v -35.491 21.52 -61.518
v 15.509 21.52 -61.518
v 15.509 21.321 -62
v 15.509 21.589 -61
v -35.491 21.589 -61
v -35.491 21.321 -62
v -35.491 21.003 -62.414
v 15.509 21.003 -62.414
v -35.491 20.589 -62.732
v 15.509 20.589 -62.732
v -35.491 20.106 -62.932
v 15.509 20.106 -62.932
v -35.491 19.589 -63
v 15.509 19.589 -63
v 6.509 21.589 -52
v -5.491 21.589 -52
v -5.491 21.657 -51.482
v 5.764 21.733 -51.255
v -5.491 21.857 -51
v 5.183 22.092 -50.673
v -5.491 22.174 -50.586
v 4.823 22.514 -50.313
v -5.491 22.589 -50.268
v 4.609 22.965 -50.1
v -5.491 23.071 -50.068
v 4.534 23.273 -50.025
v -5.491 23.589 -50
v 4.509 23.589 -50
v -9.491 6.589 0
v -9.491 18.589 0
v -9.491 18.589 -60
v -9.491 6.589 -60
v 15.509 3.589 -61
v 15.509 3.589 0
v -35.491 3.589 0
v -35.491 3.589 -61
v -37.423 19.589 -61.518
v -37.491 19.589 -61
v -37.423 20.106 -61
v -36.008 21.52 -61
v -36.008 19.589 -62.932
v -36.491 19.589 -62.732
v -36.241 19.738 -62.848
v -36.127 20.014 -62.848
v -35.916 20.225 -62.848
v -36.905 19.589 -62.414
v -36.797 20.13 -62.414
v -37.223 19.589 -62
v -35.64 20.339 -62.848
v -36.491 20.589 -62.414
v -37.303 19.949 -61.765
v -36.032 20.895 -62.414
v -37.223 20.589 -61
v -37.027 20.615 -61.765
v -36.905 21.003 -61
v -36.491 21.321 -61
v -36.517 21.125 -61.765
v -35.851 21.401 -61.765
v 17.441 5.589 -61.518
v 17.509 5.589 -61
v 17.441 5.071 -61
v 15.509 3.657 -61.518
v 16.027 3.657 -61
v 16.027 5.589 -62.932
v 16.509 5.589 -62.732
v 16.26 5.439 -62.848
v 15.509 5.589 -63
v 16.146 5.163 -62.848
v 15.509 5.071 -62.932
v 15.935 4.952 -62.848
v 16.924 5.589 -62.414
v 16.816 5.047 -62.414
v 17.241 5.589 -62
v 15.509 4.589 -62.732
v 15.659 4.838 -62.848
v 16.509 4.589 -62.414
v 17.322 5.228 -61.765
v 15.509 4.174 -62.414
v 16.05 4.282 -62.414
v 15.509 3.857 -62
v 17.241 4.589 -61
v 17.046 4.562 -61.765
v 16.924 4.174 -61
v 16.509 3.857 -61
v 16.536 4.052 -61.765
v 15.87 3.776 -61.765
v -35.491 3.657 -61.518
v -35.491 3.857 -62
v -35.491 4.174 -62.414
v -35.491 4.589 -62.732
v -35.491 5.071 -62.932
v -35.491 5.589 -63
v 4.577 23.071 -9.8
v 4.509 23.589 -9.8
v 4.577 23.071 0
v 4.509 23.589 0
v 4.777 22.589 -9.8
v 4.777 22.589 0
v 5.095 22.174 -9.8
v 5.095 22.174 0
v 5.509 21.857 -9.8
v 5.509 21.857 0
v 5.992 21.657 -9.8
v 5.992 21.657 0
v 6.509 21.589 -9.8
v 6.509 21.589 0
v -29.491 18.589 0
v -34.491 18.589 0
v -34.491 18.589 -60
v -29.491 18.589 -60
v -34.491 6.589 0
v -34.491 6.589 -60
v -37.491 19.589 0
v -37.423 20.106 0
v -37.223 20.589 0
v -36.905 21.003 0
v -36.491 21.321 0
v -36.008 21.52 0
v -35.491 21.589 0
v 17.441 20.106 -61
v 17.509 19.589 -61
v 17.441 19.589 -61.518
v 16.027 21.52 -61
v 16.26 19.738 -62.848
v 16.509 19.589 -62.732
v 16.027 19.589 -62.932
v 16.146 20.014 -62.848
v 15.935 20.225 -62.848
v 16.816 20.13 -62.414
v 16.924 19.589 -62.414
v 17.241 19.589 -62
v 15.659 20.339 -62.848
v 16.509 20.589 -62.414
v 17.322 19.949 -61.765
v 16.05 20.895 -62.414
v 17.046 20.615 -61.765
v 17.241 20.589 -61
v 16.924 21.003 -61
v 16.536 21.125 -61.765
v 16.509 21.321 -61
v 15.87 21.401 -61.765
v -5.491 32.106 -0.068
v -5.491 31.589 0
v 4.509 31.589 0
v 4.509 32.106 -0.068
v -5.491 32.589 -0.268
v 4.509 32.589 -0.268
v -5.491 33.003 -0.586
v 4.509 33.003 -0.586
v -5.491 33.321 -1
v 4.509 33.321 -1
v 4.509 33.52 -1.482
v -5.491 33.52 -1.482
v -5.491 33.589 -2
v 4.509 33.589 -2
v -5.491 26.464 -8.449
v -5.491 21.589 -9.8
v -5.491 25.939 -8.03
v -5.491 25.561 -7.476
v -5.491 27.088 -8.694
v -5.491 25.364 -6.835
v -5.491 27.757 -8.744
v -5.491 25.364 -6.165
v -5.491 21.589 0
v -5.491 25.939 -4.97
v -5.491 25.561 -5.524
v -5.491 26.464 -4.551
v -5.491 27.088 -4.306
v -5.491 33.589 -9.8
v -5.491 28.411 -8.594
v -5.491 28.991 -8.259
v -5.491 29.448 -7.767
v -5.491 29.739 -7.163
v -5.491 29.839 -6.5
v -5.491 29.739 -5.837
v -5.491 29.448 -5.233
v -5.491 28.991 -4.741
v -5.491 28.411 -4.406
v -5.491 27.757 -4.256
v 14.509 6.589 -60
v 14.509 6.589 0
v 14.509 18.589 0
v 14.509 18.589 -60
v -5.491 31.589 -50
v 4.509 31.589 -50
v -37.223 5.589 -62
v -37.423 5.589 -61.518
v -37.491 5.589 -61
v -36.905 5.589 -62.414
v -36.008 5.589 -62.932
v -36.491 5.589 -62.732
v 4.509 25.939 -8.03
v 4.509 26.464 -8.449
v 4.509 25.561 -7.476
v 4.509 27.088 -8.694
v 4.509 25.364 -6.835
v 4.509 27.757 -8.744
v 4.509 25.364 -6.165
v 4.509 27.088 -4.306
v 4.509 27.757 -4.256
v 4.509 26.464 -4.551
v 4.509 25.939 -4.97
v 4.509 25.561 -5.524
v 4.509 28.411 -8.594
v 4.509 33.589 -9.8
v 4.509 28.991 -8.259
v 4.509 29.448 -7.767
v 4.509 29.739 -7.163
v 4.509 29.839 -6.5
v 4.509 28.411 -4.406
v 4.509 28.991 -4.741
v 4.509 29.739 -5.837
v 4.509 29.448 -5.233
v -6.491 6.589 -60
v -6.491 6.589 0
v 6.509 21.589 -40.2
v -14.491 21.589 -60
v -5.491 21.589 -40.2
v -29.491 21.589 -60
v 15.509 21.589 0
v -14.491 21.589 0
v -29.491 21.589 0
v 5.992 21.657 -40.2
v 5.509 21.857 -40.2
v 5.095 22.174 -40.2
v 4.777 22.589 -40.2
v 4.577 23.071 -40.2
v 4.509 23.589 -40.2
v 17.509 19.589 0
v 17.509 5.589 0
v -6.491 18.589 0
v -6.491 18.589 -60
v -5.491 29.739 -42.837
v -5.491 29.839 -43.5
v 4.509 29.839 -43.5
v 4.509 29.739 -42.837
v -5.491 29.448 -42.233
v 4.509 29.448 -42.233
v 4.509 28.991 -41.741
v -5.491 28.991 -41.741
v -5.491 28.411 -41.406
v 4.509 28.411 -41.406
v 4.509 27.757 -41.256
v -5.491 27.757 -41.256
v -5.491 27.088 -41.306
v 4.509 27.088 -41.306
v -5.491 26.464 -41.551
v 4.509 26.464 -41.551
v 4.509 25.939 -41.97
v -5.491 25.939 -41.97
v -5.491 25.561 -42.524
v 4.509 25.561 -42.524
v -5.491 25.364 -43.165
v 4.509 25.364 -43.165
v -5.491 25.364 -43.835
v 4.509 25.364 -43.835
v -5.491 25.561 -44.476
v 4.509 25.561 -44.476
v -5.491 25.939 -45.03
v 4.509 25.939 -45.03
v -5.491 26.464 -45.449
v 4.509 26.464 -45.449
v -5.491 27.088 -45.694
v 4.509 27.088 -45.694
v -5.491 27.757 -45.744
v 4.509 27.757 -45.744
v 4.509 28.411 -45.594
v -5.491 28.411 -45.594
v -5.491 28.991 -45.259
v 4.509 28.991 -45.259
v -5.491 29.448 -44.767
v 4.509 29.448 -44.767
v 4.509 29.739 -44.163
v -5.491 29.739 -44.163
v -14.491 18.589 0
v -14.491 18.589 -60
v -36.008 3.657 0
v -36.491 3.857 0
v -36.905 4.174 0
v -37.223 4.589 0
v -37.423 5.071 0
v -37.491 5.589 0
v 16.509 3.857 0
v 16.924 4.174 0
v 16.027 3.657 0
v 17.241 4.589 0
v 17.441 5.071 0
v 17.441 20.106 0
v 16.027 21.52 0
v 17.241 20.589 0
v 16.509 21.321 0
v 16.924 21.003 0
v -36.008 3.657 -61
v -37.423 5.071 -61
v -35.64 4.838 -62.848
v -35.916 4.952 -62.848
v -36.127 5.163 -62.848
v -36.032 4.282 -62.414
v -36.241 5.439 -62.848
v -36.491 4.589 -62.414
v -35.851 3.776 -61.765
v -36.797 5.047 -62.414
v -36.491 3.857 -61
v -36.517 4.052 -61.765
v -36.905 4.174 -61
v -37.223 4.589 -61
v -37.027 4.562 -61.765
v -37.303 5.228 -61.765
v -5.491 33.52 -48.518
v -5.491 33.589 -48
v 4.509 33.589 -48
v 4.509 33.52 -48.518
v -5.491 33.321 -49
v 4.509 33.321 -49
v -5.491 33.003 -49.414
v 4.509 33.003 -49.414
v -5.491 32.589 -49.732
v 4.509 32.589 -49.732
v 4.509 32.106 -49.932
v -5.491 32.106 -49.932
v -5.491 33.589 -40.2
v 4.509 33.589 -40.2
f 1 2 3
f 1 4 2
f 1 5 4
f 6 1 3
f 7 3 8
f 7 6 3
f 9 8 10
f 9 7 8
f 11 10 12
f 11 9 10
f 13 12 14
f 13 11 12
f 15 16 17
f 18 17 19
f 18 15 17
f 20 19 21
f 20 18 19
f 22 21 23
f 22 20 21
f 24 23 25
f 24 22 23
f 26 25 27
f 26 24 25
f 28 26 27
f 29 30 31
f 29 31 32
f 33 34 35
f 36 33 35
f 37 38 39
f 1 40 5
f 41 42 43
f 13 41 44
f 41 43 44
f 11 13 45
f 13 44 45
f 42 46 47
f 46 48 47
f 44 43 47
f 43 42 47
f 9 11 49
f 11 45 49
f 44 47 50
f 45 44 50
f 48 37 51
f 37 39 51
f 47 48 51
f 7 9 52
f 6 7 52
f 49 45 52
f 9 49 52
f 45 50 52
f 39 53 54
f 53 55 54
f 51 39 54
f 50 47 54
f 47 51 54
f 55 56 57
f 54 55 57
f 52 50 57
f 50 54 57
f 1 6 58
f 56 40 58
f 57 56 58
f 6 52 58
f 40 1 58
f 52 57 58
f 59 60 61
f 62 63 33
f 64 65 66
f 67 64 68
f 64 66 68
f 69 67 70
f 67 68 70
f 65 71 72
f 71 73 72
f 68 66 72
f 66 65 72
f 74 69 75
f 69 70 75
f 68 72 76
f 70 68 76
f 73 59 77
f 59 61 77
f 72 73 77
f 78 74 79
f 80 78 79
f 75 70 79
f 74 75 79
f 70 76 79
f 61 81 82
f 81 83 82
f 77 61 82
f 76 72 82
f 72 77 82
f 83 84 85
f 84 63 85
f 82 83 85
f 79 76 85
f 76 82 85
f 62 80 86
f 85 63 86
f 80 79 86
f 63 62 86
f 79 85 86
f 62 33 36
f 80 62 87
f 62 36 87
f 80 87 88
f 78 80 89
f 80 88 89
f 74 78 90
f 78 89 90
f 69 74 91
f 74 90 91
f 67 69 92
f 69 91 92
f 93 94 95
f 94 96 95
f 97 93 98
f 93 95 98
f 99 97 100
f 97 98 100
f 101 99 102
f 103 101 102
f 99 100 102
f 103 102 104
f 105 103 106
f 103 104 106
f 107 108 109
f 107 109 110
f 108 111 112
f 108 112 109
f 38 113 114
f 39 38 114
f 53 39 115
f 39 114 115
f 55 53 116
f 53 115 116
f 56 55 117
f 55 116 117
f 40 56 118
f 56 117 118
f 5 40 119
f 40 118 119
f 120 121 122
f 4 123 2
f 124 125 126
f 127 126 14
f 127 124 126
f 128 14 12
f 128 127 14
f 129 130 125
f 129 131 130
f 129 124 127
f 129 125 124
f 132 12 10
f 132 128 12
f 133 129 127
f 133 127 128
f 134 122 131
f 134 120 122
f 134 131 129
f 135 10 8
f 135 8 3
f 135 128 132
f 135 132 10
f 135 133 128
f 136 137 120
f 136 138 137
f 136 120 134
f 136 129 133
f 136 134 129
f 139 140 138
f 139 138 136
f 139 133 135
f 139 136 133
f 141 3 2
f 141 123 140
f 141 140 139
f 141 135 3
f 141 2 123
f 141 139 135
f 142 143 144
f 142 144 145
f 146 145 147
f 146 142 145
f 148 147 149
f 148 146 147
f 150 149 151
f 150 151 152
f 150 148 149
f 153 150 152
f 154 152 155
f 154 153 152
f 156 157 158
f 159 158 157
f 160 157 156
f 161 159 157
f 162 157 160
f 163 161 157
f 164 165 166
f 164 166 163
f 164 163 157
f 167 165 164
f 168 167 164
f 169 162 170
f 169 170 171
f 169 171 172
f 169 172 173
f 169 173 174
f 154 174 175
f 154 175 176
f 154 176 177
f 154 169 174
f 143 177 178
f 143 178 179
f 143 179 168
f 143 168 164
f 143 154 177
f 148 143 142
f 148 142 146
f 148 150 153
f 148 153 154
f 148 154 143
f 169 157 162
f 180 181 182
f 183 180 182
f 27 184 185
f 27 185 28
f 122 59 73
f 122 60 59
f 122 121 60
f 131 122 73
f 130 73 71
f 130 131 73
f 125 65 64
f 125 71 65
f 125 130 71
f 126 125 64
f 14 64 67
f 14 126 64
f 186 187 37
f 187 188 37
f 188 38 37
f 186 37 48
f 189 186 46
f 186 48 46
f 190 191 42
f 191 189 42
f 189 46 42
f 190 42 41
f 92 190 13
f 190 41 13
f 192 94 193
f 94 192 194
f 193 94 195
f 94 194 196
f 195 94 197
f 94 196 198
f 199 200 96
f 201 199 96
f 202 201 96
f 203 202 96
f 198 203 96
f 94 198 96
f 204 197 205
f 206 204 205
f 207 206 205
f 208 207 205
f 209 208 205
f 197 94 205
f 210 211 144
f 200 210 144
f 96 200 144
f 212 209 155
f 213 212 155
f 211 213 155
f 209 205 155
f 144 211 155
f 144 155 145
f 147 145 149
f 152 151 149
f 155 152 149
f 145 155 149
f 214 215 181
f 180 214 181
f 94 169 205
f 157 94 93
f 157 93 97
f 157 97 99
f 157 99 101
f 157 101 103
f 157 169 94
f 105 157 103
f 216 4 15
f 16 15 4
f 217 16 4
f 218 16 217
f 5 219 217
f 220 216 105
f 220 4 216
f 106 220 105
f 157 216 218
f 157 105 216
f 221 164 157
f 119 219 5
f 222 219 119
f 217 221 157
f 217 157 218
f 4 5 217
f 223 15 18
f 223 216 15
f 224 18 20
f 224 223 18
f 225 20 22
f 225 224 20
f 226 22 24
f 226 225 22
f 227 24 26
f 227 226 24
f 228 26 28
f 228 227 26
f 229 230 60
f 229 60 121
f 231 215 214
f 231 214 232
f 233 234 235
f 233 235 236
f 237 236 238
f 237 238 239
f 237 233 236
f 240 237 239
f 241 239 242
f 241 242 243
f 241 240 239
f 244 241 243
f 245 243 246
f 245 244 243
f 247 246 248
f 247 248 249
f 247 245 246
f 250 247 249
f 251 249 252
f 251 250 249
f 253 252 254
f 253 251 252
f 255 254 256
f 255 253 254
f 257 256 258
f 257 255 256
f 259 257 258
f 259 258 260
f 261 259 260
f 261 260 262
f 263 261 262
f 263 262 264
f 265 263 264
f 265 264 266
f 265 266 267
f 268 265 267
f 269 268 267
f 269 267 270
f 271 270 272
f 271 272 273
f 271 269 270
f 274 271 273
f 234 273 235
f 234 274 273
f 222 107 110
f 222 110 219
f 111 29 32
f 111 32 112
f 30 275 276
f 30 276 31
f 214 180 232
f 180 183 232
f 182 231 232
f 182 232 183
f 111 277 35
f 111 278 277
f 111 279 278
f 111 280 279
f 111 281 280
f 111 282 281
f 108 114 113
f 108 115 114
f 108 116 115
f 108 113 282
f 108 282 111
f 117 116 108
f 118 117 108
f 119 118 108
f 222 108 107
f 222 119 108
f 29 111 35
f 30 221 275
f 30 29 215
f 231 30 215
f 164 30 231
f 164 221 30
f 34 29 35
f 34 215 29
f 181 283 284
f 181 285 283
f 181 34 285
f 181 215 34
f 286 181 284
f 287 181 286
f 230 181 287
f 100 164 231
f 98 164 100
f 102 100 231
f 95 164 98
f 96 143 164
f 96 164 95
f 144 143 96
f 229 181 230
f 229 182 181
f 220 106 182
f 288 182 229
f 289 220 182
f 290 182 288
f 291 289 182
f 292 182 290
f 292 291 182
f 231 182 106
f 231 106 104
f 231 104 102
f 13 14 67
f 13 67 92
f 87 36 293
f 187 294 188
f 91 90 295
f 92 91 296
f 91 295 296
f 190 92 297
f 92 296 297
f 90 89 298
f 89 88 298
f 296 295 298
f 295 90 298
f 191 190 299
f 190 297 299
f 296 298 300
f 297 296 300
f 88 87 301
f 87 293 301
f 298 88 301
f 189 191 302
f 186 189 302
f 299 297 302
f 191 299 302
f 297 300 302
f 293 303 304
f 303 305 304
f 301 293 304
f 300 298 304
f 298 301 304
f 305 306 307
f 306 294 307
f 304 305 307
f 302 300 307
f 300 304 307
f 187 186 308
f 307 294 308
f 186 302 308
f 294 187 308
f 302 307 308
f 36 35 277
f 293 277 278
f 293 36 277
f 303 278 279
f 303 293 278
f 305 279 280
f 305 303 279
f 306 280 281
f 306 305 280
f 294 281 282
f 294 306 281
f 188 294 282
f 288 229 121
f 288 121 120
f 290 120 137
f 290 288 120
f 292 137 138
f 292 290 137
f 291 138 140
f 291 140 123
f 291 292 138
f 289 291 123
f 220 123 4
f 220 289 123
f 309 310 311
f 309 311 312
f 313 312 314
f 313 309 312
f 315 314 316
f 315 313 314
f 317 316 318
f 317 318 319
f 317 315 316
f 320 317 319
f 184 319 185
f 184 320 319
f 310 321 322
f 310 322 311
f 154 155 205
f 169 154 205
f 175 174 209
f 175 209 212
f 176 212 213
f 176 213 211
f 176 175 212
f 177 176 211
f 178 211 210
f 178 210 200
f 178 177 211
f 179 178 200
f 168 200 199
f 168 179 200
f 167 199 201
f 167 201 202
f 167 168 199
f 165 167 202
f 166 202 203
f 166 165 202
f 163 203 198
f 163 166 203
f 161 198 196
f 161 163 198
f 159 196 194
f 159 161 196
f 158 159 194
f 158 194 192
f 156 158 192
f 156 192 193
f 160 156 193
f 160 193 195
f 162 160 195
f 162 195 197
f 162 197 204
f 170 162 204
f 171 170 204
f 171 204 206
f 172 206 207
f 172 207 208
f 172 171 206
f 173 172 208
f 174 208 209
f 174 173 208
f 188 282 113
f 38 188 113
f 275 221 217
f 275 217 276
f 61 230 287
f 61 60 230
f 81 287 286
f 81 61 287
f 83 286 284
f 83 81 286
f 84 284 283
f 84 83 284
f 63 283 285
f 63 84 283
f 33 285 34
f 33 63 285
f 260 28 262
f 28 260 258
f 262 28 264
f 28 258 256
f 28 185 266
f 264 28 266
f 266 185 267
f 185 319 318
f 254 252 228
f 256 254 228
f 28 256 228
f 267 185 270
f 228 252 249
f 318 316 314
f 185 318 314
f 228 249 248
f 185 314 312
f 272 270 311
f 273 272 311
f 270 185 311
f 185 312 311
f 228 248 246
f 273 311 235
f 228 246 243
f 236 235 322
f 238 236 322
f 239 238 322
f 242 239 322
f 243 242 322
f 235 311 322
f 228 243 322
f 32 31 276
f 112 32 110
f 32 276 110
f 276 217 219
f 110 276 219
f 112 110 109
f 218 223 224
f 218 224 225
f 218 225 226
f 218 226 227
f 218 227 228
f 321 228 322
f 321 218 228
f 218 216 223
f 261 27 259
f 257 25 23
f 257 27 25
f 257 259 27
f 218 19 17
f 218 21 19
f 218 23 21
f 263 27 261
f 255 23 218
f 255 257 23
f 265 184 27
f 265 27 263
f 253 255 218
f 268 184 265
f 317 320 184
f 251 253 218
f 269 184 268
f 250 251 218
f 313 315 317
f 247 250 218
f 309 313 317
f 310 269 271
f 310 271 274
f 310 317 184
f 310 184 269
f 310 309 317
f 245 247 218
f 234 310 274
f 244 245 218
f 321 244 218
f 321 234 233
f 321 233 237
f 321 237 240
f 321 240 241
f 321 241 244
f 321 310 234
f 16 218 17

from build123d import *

# Parameters (mm, degrees)
SKETCH1_W           = 21
SKETCH1_H           = 12
BOSS_EXTRUDE1_DEPTH = 60
SKETCH2_R           = 2.25
BOSS_EXTRUDE2_DEPTH = 10
SKETCH3_W           = 55
SKETCH3_H           = 18
BOSS_EXTRUDE3_DEPTH = 3
FILLET1_R           = 2


with BuildPart() as part:
    # Sketch1 → Boss-Extrude1 (new body)
    with BuildSketch(Plane.XY):
        Polygon((17.509291985, 21.588576814), (-9.490708015, 21.588576814), (-14.490708015, 21.588576814), (-14.490708015, 18.588576814), (-9.490708015, 18.588576814), (-9.490708015, 6.588576814), (-34.490708015, 6.588576814), (-34.490708015, 18.588576814), (-29.490708015, 18.588576814), (-29.490708015, 21.588576814), (-34.490708015, 21.588576814), (-37.490708015, 21.588576814), (-37.490708015, 3.588576814), (17.509291985, 3.588576814), align=None)
        with Locations((4.009291985, 12.588576814)):
            Rectangle(SKETCH1_W, SKETCH1_H, mode=Mode.SUBTRACT)
    extrude(amount=-BOSS_EXTRUDE1_DEPTH)

    # Sketch2 → Boss-Extrude2 (add)
    # profile 1 of 2: a face of its own
    with BuildSketch(Plane(origin=(-5.490708015, 0, 0), x_dir=(0, 0, -1), z_dir=(1, 0, 0))):
        with BuildLine():
            Line((50, 21.588576814), (40.2, 21.588576814))
            Line((40.2, 21.588576814), (40.2, 33.588576814))
            Line((40.2, 33.588576814), (48, 33.588576814))
            ThreePointArc((48, 33.588576814), (49.414213562, 33.002790376), (50, 31.588576814))
            Line((50, 31.588576814), (50, 21.588576814))
        make_face()
        with Locations(Location((43.5, 27.588576814, 0), (0, 0, 90))):
            Circle(SKETCH2_R, mode=Mode.SUBTRACT)
    # profile 2 of 2: a face of its own
    with BuildSketch(Plane(origin=(-5.490708015, 0, 0), x_dir=(0, 0, -1), z_dir=(1, 0, 0))):
        with BuildLine():
            Line((9.8, 21.588576814), (0, 21.588576814))
            Line((0, 21.588576814), (0, 31.588576814))
            ThreePointArc((0, 31.588576814), (0.585786438, 33.002790376), (2, 33.588576814))
            Line((2, 33.588576814), (9.8, 33.588576814))
            Line((9.8, 33.588576814), (9.8, 21.588576814))
        make_face()
        with Locations(Location((6.5, 27.588576814, 0), (0, 0, 90))):
            Circle(SKETCH2_R, mode=Mode.SUBTRACT)
    extrude(amount=BOSS_EXTRUDE2_DEPTH)

    # Sketch3 → Boss-Extrude3 (add)
    with BuildSketch(Plane(origin=(0, 0, -60), x_dir=(-1, 0, 0), z_dir=(0, 0, -1))):
        with Locations((9.990708015, 12.588576814)):
            Rectangle(SKETCH3_W, SKETCH3_H)
    extrude(amount=BOSS_EXTRUDE3_DEPTH)

    # Fillet1
    fillet1_edges = [part.edges().sort_by_distance(p)[0] for p in [
        (17.509291985, 3.588576814, -31.5),
        (-37.490708015, 3.588576814, -31.5),
        (-37.490708015, 21.588576814, -31.5),
        (17.509291985, 21.588576814, -31.5),
        (4.509291985, 21.588576814, -45.1),
        (-0.490708015, 21.588576814, -50),
        (4.509291985, 21.588576814, -4.9),
        (17.509291985, 12.588576814, -63),
        (-9.990708015, 3.588576814, -63),
        (-37.490708015, 12.588576814, -63),
        (-9.990708015, 21.588576814, -63),
    ]]
    fillet(fillet1_edges, radius=FILLET1_R)


solid = part.part
